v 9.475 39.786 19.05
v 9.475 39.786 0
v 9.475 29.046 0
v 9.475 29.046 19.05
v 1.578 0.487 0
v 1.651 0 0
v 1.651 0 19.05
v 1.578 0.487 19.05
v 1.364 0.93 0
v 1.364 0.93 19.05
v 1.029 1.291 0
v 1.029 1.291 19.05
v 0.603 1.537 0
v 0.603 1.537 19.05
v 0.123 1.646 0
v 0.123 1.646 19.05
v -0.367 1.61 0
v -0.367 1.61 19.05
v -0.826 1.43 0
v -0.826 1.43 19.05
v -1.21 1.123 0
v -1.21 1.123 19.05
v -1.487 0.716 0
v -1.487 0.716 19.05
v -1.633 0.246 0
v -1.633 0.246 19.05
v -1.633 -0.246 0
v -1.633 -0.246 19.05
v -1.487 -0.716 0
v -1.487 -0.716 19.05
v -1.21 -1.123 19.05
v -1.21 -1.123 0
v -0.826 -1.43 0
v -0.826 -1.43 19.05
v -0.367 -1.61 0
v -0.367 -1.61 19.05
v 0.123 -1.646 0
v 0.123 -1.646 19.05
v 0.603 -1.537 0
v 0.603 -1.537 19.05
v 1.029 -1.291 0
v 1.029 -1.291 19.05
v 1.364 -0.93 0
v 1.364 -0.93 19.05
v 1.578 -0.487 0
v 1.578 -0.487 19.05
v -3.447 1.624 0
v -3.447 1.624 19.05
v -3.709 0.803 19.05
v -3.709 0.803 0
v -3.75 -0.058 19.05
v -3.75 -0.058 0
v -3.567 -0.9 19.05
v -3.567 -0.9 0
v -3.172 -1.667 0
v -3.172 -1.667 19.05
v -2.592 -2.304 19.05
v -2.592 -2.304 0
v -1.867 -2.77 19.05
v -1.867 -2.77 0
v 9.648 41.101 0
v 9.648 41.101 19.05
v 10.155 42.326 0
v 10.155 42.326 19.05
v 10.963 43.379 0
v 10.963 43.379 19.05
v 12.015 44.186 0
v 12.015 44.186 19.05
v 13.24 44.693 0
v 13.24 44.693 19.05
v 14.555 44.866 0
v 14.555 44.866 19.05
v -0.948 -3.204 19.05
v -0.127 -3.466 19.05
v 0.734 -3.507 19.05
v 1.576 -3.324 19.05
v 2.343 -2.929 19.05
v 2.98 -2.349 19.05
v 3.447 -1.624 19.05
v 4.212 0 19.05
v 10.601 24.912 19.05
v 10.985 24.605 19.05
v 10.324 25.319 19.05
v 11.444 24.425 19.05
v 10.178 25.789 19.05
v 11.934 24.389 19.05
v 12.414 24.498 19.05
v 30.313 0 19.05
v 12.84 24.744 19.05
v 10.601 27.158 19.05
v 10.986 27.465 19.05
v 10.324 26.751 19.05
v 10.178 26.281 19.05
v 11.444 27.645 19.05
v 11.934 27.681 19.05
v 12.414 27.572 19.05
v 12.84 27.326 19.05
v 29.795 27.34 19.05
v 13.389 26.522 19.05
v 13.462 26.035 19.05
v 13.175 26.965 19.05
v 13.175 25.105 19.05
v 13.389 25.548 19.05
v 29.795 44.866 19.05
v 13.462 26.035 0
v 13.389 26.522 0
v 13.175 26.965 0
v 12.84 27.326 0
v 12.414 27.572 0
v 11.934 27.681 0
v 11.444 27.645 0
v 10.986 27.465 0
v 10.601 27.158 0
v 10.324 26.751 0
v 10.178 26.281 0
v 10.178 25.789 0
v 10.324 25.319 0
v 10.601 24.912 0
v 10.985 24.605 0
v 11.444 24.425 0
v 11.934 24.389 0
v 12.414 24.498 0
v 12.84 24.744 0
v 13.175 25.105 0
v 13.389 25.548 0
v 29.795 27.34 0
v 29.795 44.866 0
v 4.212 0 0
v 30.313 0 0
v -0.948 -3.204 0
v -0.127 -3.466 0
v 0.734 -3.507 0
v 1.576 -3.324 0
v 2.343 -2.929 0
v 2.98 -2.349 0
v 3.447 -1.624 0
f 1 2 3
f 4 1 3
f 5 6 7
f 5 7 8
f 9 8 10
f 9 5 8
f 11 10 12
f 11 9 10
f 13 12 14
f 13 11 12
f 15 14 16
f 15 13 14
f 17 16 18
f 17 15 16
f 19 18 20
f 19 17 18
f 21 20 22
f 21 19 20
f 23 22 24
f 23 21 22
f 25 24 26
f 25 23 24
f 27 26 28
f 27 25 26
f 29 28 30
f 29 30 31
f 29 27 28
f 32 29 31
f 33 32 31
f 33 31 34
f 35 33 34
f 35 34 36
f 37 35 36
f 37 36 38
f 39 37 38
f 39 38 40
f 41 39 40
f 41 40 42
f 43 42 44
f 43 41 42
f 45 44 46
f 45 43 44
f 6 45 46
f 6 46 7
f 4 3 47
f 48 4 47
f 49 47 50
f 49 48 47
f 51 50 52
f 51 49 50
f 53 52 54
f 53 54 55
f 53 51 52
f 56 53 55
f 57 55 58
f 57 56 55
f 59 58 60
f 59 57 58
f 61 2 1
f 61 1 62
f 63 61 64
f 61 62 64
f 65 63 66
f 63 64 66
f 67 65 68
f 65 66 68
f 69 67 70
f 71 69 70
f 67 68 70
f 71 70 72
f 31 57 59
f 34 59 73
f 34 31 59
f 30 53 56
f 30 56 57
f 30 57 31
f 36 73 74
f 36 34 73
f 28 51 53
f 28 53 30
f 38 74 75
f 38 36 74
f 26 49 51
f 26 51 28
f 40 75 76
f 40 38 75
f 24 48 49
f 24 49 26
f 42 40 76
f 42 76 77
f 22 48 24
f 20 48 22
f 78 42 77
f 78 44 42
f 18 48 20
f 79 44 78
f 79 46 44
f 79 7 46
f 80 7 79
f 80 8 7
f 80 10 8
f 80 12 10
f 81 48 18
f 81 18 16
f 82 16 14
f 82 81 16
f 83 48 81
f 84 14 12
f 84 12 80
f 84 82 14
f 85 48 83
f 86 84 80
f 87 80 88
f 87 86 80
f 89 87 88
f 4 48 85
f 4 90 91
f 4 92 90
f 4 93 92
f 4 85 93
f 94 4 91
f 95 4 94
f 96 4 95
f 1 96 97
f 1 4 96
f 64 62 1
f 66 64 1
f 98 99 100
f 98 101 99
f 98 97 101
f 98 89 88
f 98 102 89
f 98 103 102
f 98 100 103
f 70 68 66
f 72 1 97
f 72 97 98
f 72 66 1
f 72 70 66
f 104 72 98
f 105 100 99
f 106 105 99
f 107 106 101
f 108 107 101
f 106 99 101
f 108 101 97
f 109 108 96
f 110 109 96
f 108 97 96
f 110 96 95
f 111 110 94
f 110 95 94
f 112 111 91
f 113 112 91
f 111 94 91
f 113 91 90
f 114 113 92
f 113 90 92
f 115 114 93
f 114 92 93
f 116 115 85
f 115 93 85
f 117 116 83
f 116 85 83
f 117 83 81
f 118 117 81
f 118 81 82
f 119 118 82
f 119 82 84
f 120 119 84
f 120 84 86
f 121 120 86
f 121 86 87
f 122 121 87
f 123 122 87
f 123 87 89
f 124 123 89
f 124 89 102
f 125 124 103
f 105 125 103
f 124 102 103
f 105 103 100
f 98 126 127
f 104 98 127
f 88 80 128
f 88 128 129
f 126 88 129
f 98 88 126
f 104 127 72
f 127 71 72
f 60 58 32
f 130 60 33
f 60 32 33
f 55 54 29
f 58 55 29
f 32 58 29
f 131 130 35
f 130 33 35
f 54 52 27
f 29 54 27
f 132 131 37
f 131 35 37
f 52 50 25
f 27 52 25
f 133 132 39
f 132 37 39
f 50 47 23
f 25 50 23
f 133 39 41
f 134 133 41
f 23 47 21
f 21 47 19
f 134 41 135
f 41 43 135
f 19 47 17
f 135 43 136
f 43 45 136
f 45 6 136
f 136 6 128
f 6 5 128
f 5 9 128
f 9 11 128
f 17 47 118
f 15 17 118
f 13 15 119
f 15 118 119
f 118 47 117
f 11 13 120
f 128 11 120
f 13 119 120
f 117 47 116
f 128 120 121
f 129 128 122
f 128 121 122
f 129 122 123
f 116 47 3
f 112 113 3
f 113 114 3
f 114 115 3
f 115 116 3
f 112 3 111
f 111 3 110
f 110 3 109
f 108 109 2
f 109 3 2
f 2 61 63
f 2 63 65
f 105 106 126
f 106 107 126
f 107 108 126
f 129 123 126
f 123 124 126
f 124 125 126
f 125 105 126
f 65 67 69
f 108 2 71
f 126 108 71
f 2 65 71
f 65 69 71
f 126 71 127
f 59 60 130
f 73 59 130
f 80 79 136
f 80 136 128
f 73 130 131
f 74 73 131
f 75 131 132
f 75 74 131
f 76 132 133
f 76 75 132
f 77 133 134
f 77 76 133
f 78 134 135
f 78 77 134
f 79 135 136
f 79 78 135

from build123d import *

# Parameters (mm, degrees)
F0_R     = 1.651
F1_DEPTH = 19.05
F2_R     = 1.651
F3_DEPTH = 19.05
F5_R     = 5.08
F6_R     = 3.302
F7_DEPTH = 12.7
F9_DEPTH = 19.05


with BuildPart() as f1:
    # F0 (on Top) → F1 (new body)
    with BuildSketch(Plane.XY):
        Polygon((9.4747359406, 29.0458423255), (-4.8540289035, -1.3629774042), (2.0390528077, -4.6110267455), (17.0947359406, 27.3404749561), (17.0947359406, 44.8664749561), (9.4747359406, 44.8664749561), align=None)
        Circle(F0_R, mode=Mode.SUBTRACT)
    extrude(amount=F1_DEPTH)

    # F2 (on face) → F3 (cut, through all)
    with BuildSketch(Plane.XY.offset(19.05)):
        Circle(F2_R)
        with Locations((11.811, 26.035)):
            Circle(F2_R)
    extrude(amount=-F3_DEPTH, mode=Mode.SUBTRACT)

    # F5
    f5_edges = [f1.edges().sort_by_distance(p)[0] for p in [
        (9.474736, 44.866475, 9.525),
    ]]
    fillet(f5_edges, radius=F5_R)

    # F6
    f6_edges = [f1.edges().sort_by_distance(p)[0] for p in [
        (-4.854029, -1.362977, 9.525),
        (2.039053, -4.611027, 9.525),
    ]]
    fillet(f6_edges, radius=F6_R)

    # F7 (add): a face of the model
    f7_faces = [f1.faces().sort_by_distance(p)[0] for p in [
        (17.0947359406, 36.1034749561, 9.525),
    ]]
    extrude(f7_faces, amount=F7_DEPTH)

    # F8 (on face) → F9 (join, through all)
    with BuildSketch(Plane.XY.offset(19.05)):
        Polygon((30.3130298853, 0), (29.7947359406, 27.3404749561), (17.0947359406, 27.3404749561), (4.2117881691, 0), align=None)
    extrude(amount=-F9_DEPTH)


solid = f1.part
